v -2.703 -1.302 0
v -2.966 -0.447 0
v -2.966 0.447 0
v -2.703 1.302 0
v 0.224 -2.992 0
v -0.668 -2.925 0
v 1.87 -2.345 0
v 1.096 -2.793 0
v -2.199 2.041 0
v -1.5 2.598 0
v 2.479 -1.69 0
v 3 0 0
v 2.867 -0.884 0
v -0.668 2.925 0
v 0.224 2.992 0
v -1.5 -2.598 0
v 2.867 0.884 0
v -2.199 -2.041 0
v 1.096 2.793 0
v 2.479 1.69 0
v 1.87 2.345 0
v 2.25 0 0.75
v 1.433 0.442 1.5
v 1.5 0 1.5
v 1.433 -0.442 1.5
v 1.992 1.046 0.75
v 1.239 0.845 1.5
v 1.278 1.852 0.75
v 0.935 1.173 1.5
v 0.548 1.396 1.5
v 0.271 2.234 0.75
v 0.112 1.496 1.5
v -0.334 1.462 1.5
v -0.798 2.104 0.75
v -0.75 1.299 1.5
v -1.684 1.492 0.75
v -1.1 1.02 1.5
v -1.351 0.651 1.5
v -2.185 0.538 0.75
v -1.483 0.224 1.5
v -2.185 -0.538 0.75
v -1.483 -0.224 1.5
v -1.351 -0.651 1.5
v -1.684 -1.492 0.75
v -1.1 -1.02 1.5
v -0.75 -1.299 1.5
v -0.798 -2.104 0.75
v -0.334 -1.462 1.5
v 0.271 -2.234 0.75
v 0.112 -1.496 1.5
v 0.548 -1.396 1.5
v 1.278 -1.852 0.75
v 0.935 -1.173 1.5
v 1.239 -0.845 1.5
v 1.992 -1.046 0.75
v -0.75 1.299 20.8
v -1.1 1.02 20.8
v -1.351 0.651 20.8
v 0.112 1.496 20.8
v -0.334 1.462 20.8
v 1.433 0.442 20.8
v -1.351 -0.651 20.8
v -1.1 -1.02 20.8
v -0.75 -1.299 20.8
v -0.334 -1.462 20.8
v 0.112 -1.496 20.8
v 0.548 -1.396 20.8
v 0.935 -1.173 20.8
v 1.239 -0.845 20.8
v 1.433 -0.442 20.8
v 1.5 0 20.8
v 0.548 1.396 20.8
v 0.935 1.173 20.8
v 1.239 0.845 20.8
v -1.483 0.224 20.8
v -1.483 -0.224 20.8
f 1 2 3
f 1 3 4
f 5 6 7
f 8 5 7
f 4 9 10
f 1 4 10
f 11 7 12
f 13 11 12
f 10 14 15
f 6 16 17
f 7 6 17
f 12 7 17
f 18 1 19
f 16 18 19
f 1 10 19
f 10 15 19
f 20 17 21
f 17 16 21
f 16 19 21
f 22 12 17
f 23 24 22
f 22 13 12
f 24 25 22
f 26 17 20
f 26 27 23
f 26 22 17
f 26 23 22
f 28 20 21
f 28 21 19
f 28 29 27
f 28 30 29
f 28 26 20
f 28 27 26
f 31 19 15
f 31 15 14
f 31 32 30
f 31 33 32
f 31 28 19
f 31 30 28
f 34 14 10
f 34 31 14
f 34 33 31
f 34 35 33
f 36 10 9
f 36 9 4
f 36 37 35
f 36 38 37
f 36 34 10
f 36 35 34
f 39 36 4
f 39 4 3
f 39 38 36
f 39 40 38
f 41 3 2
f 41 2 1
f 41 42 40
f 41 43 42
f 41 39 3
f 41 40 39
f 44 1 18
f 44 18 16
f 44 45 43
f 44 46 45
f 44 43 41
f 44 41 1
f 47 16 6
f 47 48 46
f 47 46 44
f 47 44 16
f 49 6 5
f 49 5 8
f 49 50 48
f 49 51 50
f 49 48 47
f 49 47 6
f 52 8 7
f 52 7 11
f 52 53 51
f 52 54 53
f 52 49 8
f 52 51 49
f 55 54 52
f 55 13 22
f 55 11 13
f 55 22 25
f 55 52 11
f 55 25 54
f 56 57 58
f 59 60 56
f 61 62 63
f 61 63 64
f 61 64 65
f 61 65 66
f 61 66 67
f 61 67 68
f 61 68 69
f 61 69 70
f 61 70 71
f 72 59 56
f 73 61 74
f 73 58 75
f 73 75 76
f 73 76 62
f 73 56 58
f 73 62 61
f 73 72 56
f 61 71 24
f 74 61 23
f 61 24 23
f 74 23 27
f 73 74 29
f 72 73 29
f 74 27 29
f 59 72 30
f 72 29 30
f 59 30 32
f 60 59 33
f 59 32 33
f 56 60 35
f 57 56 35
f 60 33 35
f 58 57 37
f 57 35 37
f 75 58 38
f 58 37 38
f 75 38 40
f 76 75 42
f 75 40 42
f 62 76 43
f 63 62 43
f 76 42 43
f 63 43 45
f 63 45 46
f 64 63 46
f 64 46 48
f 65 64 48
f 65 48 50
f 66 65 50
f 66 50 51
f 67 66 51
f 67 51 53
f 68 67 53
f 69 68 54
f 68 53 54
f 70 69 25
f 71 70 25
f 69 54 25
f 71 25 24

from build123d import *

# Parameters (mm, degrees)
F0_R     = 3
F1_DEPTH = 1.5
F2_SIZE  = 1.49999
F3_DEPTH = 19.3


# Not quite as in the source:
# - a fillet or chamfer is up to 0.001 mm smaller than in the source, because OpenCascade refuses the exact size


with BuildPart() as f1:
    # F0 (on Top) → F1 (new body)
    with BuildSketch(Plane.XY):
        Circle(F0_R)
    extrude(amount=F1_DEPTH)

    # F2 (size 1.5 in the source; OpenCascade refuses exactly that, so slightly less here)
    f2_edges = [f1.edges().sort_by_distance(p)[0] for p in [
        (-3, 0, 1.5),
    ]]
    chamfer(f2_edges, length=F2_SIZE)

    # F3 (add): a face of the model
    f3_faces = [f1.faces().sort_by_distance(p)[0] for p in [
        (0, 0, 1.5),
    ]]
    extrude(f3_faces, amount=F3_DEPTH)


solid = f1.part
